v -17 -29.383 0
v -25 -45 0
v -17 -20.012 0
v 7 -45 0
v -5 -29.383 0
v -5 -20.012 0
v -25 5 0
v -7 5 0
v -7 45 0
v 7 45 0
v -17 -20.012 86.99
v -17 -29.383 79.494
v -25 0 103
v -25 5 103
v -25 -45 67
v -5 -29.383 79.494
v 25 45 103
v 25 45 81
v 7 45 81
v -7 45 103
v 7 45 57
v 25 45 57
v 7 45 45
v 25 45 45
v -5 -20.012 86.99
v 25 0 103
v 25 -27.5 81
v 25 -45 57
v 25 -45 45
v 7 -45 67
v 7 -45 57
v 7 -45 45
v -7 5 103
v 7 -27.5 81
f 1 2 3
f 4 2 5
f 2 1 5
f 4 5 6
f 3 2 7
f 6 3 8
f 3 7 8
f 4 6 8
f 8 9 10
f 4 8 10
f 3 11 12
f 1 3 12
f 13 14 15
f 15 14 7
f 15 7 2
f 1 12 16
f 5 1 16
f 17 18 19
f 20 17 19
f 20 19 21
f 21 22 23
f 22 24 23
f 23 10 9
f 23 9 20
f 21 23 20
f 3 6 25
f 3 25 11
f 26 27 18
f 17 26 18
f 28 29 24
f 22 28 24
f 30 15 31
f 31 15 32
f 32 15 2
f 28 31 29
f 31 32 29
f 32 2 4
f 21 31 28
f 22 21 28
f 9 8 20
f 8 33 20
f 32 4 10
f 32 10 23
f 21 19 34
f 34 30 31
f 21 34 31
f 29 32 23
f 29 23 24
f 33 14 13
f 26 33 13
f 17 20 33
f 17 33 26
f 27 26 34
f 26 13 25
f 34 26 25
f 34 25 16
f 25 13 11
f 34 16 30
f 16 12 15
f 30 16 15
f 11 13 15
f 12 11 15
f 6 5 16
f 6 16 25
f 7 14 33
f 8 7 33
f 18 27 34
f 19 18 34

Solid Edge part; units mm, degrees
sketch "Sketch1" plane through (0, 0, 0) normal (0, 0, 1) x (1, 0, 0)
  line L0 (25, -45) -> (25, 45)
  line L1 (25, 45) -> (-25, 45)
  line L2 (-25, 45) -> (-25, -45)
  line L3 (-25, -45) -> (25, -45)
extrude "Protrusion1" add sketch "Sketch1" along normal blind 103
sketch "Sketch2" plane through (0, -45, 51.5) normal (0, -1, 0) x (1, 0, 0)
  line L0 (25, 5.5) -> (25, 29.5)
  line L1 (25, 29.5) -> (7, 29.5)
  line L2 (7, 29.5) -> (7, 5.5)
  line L3 (7, 5.5) -> (25, 5.5)
  line L4 (25, -6.5) -> (25, -51.5)
  line L5 (25, -51.5) -> (7, -51.5)
  line L6 (7, -51.5) -> (7, -6.5)
  line L7 (7, -6.5) -> (25, -6.5)
extrude "Cutout1" cut sketch "Sketch2" against normal up to next
sketch "Sketch3" plane through (-25, 0, 51.5) normal (-1, 0, 0) x (0, -1, 0)
  line L0 (0, 51.5) -> (45, 15.5)
extrude "Cutout2" cut sketch "Sketch3" against normal up to next material side at (-25, -22.5312, 85.039)
sketch "Sketch4" plane through (0, 22.5, 103) normal (0, 0, 1) x (1, 0, 0)
  line L0 (-7, -17.5) -> (-7, 22.5)
  line L1 (-7, 22.5) -> (-25, 22.5)
  line L2 (-25, 22.5) -> (-25, -17.5)
  line L3 (-25, -17.5) -> (-7, -17.5)
extrude "Cutout3" cut sketch "Sketch4" against normal up to next
sketch "Sketch5" plane through (0, 0, 0) normal (0, 0, 1) x (1, 0, 0)
  line L0 (-17, -29.3826) -> (-5, -29.3826)
  line L1 (-5, -29.3826) -> (-5, -20.0122)
  line L2 (-5, -20.0122) -> (-17, -20.0122)
  line L3 (-17, -20.0122) -> (-17, -29.3826)
extrude "Cutout4" cut sketch "Sketch5" along normal up to next
